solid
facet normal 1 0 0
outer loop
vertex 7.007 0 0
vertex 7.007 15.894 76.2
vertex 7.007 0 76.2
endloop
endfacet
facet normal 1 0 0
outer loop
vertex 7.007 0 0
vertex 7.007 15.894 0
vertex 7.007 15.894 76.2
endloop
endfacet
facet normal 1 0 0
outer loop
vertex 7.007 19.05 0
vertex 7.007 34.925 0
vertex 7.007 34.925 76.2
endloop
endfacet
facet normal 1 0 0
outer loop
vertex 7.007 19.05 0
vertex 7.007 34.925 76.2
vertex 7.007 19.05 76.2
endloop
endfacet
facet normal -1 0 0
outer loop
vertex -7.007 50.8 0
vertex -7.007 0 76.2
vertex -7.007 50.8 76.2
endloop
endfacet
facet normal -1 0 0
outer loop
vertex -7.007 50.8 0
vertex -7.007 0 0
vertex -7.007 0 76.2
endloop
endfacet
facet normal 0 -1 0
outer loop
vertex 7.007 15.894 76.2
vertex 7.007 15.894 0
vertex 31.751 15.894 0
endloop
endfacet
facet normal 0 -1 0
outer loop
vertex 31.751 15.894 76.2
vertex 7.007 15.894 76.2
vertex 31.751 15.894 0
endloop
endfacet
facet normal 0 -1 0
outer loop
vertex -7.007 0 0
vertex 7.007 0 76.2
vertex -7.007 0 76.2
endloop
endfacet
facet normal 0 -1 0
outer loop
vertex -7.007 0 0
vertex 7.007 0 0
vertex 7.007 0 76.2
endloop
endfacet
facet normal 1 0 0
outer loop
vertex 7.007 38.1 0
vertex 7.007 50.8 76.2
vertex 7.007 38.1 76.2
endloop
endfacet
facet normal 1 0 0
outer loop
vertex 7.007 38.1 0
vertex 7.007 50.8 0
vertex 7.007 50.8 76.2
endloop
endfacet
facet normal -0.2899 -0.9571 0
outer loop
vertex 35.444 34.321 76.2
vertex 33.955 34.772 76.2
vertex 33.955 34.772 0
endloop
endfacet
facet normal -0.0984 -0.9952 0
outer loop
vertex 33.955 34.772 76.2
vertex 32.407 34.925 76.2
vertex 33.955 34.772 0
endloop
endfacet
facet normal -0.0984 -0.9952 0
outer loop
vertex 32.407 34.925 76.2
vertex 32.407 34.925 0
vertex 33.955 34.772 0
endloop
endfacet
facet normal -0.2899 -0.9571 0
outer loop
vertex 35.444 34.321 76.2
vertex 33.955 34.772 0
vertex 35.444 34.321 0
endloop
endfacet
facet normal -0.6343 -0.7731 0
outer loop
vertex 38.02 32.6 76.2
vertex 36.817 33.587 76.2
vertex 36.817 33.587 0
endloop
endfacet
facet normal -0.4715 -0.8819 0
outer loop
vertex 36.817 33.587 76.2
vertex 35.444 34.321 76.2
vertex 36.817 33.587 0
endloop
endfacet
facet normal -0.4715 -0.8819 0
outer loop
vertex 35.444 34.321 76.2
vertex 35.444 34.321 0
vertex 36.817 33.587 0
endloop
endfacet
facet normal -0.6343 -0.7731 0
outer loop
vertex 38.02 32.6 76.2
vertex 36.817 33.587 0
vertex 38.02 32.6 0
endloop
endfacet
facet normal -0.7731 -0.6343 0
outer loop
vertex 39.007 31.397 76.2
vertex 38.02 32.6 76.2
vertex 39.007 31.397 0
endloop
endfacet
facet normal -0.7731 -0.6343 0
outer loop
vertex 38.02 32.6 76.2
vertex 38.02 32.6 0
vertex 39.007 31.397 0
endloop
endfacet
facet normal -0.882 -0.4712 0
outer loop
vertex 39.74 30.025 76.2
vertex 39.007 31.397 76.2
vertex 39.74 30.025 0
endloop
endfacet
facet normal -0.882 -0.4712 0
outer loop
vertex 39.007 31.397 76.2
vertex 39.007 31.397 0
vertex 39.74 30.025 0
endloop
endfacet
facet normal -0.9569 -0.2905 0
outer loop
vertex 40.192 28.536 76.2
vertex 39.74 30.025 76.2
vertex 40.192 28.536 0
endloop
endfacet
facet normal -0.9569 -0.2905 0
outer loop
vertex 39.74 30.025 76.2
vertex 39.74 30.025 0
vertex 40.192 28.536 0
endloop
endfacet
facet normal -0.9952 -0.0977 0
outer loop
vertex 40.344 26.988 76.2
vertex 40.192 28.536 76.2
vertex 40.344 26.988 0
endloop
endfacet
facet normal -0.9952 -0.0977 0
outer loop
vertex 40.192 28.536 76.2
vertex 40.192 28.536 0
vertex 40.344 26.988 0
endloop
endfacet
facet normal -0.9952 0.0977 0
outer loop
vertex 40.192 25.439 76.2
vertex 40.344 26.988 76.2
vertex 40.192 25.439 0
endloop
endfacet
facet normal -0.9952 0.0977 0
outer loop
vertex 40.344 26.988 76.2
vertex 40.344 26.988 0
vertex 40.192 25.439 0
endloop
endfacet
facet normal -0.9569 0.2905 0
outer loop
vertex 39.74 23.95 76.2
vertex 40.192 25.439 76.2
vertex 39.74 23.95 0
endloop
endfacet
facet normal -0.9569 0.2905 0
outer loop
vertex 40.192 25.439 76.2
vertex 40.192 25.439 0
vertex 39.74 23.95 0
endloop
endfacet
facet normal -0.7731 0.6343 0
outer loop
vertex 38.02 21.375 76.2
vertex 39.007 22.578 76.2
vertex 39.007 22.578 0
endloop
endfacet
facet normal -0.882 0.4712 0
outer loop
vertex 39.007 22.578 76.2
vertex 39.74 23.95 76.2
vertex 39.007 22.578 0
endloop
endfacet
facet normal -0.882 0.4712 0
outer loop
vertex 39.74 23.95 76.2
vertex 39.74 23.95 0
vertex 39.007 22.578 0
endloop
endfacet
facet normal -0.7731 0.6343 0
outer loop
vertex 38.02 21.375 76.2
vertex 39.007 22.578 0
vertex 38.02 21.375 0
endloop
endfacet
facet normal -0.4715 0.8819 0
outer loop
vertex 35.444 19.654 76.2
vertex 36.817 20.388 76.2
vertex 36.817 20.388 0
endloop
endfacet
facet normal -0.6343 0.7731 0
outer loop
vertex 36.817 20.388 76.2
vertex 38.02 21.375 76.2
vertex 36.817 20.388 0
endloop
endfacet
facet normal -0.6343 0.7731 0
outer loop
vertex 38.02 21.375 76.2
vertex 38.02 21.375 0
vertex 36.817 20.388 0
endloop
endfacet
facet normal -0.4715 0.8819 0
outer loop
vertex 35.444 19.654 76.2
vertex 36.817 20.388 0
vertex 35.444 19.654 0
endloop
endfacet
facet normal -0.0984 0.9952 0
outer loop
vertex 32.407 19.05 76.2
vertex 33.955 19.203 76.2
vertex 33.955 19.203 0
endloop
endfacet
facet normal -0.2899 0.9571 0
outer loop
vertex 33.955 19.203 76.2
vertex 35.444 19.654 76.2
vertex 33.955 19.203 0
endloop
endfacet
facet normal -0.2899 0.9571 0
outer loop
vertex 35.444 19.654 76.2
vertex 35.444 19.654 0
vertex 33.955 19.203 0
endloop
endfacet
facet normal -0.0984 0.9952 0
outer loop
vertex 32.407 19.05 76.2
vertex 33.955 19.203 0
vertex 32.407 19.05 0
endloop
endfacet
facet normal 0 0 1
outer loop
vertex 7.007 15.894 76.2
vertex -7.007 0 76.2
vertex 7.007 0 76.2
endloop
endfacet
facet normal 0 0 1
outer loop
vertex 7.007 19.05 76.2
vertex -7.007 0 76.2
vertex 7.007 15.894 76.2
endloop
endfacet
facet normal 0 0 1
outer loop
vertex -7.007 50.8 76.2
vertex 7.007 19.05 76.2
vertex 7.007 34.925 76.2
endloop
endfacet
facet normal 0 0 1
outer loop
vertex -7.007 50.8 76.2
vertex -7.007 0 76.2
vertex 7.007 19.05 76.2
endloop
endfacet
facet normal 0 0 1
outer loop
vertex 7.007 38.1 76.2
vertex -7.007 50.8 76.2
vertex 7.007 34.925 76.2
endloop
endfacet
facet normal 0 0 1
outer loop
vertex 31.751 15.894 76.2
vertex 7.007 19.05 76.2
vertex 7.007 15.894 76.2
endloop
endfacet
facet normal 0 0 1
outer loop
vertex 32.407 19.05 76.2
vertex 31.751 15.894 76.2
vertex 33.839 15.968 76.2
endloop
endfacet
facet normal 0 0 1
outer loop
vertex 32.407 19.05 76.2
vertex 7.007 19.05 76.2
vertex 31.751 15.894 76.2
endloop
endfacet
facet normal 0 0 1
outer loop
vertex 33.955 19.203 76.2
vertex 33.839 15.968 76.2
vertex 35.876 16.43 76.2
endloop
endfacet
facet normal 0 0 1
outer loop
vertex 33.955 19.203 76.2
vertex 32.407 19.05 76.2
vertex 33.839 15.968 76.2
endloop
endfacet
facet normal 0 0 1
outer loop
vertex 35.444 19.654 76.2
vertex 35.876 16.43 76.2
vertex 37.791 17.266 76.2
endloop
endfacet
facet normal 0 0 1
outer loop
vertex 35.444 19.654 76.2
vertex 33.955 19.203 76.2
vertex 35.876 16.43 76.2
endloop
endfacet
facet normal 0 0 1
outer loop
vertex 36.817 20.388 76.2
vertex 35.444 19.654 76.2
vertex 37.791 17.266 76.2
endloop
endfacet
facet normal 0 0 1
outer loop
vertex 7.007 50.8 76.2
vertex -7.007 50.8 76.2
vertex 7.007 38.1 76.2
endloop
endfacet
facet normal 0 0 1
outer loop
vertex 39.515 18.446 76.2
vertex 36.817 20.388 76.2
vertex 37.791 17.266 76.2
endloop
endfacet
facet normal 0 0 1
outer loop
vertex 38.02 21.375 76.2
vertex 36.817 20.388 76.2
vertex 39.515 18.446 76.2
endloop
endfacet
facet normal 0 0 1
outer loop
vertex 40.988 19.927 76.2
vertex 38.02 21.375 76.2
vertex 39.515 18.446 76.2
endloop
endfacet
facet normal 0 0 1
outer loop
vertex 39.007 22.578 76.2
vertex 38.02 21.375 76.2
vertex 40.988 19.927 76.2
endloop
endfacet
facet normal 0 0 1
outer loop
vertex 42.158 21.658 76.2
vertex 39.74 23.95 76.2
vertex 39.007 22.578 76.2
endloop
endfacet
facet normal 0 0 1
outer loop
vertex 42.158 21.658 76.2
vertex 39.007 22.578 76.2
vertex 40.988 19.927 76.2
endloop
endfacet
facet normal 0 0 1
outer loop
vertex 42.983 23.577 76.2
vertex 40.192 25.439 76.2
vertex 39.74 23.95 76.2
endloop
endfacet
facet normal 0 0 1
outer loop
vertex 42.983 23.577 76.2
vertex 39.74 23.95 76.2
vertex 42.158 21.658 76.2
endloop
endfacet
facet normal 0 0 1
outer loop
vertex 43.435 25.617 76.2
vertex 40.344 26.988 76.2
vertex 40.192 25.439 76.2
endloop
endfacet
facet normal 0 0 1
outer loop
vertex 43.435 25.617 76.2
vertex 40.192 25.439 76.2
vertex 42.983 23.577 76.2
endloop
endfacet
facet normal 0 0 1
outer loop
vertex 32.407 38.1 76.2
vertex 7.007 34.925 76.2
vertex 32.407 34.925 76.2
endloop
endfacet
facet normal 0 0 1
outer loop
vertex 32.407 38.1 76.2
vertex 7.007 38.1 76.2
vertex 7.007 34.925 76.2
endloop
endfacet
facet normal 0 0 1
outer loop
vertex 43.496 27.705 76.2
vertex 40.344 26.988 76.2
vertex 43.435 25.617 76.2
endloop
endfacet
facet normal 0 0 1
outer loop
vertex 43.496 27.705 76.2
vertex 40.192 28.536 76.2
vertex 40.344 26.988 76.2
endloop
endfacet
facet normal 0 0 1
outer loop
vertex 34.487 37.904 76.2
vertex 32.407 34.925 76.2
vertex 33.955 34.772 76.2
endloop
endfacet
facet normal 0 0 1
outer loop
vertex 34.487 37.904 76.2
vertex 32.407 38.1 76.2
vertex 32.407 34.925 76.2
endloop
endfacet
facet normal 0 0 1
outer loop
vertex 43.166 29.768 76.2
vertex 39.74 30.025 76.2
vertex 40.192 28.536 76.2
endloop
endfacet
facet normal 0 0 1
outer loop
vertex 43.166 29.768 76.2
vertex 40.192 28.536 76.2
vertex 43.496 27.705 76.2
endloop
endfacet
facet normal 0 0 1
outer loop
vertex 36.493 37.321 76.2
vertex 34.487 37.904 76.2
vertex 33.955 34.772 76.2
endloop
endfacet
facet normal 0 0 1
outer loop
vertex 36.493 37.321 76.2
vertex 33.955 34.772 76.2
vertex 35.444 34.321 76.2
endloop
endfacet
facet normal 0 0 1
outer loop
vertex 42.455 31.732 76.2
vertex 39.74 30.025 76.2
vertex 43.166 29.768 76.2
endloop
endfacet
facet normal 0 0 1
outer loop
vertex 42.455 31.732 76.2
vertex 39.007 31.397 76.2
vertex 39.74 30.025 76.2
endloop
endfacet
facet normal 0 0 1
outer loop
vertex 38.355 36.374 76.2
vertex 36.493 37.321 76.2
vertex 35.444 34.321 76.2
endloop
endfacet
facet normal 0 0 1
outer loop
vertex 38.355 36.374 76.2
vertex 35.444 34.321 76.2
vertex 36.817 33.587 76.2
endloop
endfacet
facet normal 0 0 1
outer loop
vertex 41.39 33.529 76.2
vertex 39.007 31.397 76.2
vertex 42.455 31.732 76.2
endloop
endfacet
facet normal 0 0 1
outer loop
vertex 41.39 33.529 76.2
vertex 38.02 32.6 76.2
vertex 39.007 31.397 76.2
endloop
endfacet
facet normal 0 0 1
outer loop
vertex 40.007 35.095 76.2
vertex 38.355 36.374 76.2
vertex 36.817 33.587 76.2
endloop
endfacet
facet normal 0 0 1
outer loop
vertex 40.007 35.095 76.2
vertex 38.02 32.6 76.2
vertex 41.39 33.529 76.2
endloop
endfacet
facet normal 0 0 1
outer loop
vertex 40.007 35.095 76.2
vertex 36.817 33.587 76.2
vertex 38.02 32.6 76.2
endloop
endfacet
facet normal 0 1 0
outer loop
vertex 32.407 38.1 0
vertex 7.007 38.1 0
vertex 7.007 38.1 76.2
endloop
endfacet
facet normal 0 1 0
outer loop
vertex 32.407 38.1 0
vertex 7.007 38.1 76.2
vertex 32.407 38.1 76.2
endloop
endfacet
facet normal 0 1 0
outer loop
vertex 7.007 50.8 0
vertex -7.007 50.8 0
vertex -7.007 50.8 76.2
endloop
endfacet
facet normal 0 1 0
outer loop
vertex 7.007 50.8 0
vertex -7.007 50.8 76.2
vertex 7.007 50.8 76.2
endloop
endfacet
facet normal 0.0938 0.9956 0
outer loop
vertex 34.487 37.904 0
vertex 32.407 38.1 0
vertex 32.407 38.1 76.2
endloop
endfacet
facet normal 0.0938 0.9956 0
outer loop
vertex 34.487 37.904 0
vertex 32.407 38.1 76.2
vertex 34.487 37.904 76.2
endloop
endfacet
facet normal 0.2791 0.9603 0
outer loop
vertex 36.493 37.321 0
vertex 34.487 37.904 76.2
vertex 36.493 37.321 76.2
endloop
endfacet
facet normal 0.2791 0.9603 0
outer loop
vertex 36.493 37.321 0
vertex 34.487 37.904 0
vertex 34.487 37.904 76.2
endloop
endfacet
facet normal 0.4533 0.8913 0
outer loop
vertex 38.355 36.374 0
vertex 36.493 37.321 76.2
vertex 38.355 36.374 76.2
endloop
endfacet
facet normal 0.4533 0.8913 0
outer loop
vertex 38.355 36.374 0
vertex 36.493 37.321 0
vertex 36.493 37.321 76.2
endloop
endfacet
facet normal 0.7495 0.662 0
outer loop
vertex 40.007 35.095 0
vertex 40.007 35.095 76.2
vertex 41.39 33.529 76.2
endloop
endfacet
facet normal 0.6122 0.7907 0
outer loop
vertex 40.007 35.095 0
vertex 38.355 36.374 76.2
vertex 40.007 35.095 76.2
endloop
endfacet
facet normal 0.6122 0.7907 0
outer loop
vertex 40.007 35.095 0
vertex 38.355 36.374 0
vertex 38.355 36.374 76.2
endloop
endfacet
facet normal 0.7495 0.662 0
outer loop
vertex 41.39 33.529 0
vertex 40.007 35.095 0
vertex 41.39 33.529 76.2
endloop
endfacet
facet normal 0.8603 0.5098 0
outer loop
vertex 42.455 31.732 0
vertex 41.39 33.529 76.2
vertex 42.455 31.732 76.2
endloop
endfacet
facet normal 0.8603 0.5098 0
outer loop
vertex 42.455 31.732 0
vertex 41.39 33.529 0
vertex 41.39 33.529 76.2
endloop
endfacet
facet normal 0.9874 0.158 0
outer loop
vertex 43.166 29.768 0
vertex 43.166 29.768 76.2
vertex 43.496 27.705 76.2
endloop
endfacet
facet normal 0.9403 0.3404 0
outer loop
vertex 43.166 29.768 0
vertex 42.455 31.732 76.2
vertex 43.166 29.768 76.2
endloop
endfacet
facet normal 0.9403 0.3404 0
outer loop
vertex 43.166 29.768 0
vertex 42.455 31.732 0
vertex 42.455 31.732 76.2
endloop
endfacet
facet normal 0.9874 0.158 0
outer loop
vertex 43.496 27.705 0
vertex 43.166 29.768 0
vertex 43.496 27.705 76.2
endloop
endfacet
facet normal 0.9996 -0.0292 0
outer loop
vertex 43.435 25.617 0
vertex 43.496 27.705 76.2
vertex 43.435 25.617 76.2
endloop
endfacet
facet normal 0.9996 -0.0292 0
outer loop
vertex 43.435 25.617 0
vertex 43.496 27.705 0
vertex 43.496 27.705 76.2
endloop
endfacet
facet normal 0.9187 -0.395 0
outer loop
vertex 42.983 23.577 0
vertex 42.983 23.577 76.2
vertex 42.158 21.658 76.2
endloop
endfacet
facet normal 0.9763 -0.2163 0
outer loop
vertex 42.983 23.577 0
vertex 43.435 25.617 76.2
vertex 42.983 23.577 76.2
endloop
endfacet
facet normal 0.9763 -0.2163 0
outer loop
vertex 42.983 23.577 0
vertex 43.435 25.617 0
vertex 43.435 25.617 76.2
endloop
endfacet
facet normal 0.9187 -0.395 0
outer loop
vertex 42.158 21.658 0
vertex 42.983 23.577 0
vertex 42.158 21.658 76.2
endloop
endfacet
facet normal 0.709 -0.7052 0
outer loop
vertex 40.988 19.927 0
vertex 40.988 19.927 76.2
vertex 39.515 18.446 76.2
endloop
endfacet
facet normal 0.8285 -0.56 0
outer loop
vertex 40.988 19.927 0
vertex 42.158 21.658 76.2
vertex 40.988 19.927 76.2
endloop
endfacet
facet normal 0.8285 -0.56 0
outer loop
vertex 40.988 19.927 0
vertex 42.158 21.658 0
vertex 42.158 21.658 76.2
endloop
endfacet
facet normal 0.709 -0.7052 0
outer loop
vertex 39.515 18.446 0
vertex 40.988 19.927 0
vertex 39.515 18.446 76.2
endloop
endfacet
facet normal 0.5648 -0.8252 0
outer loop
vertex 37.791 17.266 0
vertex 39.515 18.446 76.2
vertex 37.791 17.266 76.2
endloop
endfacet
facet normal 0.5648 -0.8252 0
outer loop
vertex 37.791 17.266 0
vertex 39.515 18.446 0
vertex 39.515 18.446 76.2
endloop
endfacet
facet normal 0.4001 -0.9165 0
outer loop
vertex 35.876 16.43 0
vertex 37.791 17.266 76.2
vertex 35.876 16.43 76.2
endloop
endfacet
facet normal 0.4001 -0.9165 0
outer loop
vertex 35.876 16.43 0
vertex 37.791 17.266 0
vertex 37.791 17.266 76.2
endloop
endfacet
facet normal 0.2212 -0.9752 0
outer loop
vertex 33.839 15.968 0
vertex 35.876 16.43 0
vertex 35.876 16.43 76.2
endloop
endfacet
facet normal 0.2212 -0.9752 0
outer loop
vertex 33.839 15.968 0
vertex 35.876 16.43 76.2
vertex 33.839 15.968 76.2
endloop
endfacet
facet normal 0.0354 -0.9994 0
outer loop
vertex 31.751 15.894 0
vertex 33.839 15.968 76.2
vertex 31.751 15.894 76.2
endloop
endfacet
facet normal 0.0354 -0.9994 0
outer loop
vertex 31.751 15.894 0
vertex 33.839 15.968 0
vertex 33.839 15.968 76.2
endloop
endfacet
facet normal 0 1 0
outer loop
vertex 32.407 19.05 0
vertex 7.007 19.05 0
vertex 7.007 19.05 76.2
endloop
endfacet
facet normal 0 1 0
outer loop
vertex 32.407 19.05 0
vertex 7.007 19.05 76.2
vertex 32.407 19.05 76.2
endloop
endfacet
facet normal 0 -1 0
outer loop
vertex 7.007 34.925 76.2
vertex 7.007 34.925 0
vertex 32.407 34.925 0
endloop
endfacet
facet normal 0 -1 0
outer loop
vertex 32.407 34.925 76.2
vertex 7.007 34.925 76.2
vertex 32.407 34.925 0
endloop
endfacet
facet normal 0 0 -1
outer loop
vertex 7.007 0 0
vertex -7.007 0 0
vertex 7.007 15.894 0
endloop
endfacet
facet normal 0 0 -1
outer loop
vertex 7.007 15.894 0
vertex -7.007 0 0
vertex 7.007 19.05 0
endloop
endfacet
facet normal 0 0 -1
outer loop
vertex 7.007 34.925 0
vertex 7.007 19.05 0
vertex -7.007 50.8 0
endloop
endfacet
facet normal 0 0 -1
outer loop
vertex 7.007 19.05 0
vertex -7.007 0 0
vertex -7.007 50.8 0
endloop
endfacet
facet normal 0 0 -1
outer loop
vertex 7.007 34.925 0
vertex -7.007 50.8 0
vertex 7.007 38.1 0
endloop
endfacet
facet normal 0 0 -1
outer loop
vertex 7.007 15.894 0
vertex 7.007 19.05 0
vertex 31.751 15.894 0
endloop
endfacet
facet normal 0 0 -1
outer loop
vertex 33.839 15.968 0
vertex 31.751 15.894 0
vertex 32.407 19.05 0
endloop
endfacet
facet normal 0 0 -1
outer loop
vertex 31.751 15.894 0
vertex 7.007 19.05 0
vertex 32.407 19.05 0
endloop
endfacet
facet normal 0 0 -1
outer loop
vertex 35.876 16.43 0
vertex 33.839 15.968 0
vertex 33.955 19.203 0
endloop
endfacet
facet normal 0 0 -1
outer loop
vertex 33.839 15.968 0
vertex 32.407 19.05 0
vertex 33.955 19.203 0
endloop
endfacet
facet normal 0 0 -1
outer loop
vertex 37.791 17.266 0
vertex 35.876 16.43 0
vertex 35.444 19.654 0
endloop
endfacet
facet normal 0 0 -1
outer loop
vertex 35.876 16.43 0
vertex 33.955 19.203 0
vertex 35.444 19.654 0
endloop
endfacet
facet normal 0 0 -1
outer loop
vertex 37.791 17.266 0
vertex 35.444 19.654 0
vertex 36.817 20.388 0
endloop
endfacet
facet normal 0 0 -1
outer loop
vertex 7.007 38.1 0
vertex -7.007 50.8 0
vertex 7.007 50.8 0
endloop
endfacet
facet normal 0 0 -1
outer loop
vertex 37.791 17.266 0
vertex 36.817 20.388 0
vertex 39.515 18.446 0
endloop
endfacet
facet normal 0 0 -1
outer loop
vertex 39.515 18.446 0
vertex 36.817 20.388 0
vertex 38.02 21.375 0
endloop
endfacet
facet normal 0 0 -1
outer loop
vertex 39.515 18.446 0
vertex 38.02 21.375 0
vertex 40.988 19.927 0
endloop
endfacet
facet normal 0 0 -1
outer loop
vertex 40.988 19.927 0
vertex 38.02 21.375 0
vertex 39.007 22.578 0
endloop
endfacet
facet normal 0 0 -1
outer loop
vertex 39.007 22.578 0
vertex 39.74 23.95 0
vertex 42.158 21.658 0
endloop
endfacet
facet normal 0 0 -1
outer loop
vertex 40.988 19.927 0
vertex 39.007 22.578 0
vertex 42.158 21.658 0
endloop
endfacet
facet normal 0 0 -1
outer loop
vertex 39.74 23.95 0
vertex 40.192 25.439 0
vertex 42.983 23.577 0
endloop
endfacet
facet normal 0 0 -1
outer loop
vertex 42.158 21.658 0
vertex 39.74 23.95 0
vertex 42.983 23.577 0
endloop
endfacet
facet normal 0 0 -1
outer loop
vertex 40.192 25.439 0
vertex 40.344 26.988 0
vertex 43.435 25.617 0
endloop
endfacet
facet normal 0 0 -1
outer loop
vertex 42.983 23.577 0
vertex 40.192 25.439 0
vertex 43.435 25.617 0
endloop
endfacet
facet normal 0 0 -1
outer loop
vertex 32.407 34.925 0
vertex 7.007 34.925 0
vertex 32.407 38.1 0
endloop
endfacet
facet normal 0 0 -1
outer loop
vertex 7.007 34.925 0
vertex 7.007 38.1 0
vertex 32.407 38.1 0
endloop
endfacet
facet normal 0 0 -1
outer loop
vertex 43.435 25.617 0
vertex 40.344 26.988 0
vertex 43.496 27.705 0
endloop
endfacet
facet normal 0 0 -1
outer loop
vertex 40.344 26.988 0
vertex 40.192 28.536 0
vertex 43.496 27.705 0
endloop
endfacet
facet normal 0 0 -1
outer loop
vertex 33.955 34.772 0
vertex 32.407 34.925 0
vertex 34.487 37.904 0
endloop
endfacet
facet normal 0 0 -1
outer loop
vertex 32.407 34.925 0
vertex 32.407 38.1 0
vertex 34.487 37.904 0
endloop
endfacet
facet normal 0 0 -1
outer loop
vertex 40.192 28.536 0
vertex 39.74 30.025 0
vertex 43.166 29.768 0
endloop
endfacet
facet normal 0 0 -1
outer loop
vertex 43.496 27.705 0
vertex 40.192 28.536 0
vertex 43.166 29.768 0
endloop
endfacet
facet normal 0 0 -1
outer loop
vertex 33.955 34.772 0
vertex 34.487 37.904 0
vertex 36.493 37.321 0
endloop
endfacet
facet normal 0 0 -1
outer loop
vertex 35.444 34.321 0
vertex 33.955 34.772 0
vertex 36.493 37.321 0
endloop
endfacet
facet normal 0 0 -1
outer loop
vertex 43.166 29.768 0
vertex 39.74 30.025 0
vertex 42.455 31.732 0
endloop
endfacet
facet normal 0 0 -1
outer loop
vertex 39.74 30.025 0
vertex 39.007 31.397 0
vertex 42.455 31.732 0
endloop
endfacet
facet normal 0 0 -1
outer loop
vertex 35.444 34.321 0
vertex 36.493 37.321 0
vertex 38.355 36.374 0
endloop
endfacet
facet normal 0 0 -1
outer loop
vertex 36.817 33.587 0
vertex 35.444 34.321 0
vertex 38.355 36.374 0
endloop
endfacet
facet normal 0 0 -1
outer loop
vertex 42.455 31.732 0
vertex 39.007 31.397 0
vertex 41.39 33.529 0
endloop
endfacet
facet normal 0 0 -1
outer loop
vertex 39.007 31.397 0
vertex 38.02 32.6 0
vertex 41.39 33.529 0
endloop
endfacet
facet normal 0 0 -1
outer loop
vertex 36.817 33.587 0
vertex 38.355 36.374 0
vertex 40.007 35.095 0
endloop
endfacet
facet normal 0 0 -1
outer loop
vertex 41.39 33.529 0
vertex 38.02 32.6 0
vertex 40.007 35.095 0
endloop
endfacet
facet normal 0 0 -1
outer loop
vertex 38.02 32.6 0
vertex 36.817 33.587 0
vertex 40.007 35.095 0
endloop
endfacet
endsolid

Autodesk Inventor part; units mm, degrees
ref_plane "YZ Plane" through (0, 0, 0) normal (1, 0, 0) x (0, 1, 0)
ref_plane "XZ Plane" through (0, 0, 0) normal (0, 1, 0) x (-1, 0, 0)
ref_plane "XY Plane" through (0, 0, 0) normal (0, 0, 1) x (1, 0, 0)
sketch "Sketch1" plane through (0, 0, 0) normal (0, 0, 1) x (1, 0, 0)
  line L0 (-7.0069, 50.8) -> (7.0069, 50.8)
  line L1 (7.0069, 50.8) -> (7.0069, 0)
  line L2 (7.0069, 0) -> (-7.0069, 0)
  line L3 (-7.0069, 0) -> (-7.0069, 50.8)
  line L4 (7.0069, 34.925) -> (32.4069, 34.925)
  line L5 (7.0069, 19.05) -> (32.4069, 19.05)
  arc A0 (32.4069, 19.05) -> (32.4069, 34.925) centre (32.4069, 26.9875) ccw
  line L6 (7.0069, 38.1) -> (32.4069, 38.1)
  line L7 (7.9386, 15.8944) -> (31.7511, 15.8944)
  arc A1 (31.7511, 15.8944) -> (32.4069, 38.1) centre (32.4069, 26.9875) ccw
  line L8 (7.9386, 15.8944) -> (7.0069, 15.8944)
  point P0 (0, 0)
  dimension "d0" = 50.8
  dimension "d1" = 25.4
extrude "Extrusion1" add sketch "Sketch1" along normal blind 76.2 contours L0 L1 L2 L3 | L6 A1 L7 L8 L1 L5 A0 L4
properties part number "WireHolder"
